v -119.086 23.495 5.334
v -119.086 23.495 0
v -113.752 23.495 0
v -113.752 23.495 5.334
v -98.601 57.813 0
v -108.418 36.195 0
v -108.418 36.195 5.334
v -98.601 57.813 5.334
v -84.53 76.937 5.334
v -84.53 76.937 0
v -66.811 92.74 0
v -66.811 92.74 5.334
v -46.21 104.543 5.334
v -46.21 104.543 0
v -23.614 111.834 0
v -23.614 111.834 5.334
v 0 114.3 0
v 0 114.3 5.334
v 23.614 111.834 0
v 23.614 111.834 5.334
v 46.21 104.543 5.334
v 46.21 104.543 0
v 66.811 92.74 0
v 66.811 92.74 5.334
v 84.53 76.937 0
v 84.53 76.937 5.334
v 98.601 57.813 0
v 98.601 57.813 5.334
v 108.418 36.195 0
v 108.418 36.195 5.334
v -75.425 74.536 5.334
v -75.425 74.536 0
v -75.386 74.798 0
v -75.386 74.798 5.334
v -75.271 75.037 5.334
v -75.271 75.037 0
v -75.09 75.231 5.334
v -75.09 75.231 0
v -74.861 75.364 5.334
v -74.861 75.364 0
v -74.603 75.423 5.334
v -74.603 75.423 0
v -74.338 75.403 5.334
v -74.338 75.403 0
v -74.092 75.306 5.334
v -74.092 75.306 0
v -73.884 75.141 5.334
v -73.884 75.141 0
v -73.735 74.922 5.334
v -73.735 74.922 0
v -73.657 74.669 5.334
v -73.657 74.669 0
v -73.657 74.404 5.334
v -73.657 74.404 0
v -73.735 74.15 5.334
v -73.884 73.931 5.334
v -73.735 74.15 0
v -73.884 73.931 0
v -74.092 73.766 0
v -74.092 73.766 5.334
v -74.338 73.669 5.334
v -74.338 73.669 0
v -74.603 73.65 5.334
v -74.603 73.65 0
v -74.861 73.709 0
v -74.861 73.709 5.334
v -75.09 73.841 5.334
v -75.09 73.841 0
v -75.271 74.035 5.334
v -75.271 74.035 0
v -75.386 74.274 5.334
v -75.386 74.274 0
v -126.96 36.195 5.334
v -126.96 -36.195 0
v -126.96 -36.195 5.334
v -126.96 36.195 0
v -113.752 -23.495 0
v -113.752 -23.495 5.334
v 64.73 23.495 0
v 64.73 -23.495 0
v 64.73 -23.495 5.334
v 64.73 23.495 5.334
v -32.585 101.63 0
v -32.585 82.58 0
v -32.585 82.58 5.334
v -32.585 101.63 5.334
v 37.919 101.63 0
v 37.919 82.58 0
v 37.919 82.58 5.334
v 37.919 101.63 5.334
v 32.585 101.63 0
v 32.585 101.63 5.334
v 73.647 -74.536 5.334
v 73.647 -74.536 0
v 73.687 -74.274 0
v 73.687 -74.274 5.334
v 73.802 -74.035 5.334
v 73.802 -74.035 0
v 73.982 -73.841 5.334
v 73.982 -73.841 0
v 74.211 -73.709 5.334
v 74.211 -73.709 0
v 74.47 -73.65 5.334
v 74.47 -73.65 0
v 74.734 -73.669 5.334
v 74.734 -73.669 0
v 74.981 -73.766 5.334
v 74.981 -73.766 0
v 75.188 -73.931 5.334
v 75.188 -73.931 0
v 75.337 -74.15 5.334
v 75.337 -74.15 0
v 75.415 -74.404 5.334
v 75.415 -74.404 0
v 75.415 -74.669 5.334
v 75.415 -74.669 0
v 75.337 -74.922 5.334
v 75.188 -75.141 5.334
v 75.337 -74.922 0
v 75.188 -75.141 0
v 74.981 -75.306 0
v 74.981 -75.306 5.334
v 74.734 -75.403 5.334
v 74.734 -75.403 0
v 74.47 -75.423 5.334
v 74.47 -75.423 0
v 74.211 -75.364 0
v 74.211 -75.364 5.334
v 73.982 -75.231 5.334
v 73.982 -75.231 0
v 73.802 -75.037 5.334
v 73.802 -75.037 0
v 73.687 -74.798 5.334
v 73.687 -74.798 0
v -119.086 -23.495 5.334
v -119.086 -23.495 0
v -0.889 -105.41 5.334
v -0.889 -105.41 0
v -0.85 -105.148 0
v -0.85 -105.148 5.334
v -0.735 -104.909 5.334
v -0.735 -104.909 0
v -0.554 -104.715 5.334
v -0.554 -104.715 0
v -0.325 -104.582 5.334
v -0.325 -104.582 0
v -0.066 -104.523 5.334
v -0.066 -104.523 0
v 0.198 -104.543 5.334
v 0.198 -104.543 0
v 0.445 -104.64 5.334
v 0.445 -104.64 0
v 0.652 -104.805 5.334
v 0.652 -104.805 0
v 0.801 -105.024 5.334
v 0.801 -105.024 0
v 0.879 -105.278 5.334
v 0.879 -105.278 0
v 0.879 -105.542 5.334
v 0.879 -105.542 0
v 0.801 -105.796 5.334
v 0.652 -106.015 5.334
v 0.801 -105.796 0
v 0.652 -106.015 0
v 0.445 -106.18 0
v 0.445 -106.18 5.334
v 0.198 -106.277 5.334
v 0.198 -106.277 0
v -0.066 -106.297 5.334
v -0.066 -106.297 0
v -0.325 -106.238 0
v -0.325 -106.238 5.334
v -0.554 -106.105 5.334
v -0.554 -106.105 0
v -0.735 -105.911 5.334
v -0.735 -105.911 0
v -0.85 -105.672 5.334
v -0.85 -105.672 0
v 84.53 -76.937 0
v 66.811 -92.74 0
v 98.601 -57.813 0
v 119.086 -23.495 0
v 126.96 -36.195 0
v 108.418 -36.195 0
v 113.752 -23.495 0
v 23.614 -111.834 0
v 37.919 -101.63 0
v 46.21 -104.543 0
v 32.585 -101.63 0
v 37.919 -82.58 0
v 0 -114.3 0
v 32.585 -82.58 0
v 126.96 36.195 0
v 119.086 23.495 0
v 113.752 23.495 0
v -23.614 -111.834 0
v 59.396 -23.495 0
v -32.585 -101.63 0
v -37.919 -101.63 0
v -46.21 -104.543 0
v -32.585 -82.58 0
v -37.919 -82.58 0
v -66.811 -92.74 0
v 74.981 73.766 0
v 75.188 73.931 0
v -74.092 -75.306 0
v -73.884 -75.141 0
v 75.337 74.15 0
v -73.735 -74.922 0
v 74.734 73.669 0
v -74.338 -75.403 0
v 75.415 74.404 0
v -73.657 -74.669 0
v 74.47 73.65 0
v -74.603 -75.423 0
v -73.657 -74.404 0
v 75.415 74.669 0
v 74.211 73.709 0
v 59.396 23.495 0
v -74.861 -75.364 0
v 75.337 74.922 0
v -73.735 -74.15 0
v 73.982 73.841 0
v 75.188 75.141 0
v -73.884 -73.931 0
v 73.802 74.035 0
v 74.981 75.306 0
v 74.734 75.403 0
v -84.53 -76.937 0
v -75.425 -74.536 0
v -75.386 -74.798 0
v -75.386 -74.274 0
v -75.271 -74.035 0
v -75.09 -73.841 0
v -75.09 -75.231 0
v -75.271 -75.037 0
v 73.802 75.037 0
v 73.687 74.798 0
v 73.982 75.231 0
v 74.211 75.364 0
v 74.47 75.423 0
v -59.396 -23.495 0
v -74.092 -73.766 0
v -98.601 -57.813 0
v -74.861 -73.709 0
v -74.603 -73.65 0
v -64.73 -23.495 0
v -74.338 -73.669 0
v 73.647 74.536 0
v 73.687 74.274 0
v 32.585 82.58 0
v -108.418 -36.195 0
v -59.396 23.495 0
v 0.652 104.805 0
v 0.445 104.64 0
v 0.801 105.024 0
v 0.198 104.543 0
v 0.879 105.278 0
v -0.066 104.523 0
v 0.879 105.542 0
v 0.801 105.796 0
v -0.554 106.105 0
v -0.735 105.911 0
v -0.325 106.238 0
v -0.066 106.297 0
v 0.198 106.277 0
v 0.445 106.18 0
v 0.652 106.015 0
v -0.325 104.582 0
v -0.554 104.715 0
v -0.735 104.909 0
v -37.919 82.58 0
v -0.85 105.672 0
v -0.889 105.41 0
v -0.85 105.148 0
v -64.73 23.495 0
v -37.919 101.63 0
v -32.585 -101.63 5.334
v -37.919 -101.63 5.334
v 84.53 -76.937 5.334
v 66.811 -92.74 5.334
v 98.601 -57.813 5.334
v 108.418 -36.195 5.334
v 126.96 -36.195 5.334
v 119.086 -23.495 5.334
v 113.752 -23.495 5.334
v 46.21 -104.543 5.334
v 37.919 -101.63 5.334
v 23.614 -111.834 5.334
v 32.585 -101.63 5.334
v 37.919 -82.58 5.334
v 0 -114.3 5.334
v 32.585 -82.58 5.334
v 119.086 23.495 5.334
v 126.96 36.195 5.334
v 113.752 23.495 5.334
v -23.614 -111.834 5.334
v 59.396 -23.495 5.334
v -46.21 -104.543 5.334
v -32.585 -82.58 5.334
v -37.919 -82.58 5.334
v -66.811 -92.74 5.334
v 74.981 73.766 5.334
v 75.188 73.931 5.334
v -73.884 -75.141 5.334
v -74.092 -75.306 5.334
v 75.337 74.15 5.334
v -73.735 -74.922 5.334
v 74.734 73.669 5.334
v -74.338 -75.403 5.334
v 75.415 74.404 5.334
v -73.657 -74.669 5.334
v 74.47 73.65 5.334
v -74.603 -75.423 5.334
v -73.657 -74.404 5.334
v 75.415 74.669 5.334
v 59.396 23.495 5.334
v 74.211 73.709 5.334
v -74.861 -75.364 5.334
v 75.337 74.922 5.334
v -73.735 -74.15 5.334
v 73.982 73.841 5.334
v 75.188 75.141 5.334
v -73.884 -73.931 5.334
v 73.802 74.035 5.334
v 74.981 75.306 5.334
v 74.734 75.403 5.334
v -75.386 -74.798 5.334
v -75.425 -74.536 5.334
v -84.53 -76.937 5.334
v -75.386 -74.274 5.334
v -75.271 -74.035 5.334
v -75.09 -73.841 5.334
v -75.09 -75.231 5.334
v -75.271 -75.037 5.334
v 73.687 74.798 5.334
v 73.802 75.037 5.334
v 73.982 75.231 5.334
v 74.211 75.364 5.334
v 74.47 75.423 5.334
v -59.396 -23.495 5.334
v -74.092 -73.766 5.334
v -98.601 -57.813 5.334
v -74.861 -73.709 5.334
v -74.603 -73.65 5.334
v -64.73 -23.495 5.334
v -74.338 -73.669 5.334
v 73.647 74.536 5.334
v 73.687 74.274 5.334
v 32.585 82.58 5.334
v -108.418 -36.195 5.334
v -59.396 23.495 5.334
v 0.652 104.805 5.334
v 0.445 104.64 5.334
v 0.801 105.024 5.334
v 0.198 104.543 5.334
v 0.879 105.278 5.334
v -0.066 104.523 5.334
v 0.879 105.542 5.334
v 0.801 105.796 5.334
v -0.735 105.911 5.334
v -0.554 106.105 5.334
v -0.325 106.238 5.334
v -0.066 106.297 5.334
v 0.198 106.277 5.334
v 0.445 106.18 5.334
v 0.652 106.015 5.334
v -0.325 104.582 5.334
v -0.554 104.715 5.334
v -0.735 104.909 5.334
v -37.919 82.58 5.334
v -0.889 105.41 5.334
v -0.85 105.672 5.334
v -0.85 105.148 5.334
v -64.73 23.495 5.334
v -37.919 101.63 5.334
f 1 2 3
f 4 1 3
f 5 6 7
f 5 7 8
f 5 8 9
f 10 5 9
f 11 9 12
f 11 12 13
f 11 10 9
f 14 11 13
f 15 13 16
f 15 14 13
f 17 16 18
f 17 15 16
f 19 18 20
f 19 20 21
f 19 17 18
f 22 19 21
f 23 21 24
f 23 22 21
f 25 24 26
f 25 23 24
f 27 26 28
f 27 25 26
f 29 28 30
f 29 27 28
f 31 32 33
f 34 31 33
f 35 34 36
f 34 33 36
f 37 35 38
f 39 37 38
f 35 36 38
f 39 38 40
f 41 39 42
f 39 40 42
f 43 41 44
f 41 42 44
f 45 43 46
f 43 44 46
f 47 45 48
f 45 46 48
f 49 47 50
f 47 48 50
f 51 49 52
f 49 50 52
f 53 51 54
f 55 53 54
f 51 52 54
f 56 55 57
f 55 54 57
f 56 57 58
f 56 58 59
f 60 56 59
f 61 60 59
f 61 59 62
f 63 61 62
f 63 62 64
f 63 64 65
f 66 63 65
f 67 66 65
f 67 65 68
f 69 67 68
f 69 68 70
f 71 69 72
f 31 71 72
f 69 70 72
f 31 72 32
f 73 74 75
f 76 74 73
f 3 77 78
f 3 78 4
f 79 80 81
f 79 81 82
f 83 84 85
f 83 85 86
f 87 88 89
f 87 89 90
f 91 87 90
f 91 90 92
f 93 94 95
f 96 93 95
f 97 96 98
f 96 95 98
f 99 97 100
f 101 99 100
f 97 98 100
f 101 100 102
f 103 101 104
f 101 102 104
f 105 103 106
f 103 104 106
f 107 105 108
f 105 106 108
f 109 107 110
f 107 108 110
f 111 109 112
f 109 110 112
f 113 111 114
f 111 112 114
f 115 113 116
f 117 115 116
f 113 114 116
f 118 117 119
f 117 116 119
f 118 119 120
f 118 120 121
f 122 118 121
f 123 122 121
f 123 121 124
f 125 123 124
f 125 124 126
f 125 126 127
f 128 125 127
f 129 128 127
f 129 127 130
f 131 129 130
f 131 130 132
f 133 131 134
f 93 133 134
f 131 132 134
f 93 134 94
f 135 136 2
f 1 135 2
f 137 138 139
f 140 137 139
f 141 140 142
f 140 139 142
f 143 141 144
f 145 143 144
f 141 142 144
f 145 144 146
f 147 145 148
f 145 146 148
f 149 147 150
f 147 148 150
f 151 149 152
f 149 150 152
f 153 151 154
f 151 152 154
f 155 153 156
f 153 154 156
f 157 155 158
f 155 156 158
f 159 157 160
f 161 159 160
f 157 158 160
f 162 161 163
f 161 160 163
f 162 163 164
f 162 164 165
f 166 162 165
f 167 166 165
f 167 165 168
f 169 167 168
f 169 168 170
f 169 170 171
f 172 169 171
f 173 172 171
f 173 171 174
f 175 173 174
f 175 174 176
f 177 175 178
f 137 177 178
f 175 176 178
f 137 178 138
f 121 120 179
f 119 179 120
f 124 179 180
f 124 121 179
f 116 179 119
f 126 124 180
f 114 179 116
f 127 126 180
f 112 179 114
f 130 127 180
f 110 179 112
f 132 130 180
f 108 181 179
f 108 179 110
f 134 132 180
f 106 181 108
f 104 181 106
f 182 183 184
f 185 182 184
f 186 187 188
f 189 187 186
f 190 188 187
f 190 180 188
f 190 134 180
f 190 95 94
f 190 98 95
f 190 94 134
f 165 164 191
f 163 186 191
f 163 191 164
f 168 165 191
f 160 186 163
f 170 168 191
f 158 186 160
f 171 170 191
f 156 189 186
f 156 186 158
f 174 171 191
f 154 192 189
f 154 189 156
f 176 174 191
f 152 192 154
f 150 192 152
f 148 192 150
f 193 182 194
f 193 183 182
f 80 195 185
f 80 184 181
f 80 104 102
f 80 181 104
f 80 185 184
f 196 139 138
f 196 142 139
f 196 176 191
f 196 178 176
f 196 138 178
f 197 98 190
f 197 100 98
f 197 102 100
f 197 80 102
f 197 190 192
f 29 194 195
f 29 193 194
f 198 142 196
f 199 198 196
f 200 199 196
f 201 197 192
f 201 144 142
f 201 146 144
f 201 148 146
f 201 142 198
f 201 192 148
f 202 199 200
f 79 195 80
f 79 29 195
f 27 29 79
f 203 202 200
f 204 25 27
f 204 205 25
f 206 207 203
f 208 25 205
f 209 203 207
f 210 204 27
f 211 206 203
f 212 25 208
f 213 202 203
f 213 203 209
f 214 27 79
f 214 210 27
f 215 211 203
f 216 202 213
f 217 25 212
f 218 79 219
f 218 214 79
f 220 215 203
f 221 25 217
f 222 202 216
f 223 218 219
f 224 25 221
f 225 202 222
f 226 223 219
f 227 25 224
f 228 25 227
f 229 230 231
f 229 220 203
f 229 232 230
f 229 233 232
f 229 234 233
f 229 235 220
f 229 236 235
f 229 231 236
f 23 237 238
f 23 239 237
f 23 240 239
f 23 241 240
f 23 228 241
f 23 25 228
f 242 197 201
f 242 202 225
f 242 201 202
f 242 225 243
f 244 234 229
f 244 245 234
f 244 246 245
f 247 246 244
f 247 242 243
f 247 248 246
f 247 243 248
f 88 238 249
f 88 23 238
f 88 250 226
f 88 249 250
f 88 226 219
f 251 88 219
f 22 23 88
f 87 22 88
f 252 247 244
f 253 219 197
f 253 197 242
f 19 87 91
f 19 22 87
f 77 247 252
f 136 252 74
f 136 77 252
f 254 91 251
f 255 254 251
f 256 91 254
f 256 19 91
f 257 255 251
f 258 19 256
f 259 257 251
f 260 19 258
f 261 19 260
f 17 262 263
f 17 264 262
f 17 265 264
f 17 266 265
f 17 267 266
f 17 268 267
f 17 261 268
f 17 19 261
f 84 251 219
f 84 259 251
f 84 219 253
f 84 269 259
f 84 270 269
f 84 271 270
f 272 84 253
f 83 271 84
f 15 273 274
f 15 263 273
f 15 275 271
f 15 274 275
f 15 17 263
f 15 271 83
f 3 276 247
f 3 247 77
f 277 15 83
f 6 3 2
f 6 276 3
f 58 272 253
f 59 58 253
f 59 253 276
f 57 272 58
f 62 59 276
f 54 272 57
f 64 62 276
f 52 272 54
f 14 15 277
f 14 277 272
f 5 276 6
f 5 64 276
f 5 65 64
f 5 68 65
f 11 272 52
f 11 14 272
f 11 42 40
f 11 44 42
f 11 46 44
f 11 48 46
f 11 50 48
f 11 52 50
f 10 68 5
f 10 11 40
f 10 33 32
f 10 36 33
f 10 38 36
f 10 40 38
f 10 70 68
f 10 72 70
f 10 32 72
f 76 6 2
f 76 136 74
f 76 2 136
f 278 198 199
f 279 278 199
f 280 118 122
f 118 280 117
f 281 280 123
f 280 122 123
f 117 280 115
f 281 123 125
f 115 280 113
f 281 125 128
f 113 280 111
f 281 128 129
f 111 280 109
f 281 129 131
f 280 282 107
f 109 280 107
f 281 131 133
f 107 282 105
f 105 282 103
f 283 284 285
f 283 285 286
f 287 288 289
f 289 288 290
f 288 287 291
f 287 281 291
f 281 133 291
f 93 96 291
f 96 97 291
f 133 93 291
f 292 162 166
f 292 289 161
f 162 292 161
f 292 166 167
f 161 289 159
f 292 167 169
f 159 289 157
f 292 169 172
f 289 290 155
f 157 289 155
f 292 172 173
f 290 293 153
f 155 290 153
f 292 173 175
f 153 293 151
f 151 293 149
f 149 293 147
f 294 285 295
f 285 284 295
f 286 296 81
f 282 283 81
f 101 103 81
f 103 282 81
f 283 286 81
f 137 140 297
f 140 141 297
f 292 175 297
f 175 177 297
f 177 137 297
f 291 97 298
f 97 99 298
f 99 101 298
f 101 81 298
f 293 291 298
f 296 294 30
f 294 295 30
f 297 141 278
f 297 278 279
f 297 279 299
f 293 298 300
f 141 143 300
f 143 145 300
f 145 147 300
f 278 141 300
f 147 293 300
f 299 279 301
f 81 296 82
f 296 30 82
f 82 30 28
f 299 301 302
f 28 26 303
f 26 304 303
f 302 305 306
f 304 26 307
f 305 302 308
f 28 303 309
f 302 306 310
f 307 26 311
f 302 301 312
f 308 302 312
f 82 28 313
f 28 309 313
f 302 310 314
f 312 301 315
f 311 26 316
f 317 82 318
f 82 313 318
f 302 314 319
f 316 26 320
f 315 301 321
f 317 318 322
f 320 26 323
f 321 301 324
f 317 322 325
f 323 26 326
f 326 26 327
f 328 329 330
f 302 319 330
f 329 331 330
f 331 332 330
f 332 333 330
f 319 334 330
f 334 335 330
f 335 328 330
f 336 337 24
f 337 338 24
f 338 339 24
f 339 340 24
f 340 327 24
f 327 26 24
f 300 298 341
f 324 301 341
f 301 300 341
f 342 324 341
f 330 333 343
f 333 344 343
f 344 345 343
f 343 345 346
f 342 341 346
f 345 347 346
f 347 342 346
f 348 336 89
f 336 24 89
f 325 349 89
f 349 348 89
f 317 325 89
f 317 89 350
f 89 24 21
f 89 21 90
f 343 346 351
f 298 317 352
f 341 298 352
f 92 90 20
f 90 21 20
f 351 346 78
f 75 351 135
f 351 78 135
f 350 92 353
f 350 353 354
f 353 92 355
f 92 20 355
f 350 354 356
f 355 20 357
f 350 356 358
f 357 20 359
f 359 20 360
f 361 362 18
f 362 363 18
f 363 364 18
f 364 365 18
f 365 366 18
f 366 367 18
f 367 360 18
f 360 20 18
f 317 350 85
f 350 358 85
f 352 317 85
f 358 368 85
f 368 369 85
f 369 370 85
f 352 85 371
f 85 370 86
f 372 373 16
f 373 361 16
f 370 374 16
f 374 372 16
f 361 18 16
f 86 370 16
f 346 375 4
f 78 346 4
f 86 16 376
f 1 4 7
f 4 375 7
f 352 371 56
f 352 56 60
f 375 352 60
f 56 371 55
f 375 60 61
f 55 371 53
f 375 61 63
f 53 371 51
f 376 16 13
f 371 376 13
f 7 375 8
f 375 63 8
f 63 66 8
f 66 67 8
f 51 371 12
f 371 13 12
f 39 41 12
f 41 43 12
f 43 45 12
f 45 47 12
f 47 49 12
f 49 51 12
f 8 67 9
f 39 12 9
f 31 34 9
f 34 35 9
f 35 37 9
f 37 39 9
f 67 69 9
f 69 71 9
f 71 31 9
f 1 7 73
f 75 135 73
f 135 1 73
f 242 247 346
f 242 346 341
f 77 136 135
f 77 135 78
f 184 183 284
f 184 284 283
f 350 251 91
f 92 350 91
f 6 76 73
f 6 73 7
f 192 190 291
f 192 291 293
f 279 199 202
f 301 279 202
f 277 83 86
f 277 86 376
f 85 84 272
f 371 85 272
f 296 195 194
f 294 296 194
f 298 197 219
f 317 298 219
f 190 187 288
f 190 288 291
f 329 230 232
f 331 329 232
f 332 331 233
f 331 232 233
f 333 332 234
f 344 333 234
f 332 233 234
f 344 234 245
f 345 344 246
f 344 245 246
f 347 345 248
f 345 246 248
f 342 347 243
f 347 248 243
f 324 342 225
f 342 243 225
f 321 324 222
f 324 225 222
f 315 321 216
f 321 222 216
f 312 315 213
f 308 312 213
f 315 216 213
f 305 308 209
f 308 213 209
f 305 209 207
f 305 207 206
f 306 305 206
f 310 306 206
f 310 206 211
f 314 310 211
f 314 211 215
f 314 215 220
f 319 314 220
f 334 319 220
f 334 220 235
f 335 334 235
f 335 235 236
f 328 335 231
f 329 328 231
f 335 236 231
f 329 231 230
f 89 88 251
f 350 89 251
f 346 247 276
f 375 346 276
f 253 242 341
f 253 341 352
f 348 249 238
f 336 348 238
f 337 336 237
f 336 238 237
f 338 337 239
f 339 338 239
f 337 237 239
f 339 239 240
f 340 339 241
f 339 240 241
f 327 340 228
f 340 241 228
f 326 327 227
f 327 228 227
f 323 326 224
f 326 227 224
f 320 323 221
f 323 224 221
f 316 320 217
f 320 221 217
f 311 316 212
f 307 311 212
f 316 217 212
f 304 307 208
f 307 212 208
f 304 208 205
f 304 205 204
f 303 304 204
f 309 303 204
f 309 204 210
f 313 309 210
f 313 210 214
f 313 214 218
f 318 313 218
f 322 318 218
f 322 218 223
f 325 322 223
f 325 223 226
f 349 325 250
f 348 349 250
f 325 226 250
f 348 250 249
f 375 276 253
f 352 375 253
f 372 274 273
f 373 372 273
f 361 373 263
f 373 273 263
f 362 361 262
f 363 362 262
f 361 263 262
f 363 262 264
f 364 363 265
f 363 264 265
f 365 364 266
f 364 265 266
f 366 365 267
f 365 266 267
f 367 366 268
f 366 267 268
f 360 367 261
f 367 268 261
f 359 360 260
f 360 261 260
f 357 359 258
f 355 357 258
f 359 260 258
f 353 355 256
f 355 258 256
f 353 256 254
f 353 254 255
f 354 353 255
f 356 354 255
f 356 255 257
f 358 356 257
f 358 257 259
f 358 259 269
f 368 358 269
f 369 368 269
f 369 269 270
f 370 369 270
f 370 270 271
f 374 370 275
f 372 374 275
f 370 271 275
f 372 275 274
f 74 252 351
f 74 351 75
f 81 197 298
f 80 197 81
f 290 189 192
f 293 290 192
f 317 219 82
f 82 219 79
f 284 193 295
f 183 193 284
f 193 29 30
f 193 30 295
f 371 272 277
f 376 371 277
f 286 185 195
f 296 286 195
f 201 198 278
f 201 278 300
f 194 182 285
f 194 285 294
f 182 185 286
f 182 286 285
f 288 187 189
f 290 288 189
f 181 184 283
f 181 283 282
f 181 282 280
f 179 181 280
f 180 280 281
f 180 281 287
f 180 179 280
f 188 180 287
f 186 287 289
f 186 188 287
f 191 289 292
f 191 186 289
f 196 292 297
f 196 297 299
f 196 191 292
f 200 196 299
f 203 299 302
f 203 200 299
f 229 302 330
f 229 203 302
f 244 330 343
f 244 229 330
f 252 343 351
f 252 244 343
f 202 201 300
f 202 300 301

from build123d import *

# Parameters (mm, degrees)
SKETCH1_W                     = 5.334
SKETCH1_H                     = 46.99
BASE_PLATFORM_DEPTH           = 5.334
SKETCH5_R                     = 0.889
PERIMETER_STACKING_CUTS_DEPTH = 5.334
SKETCH6_W                     = 5.334
SKETCH6_H                     = 19.05
SKID_HOLES_DEPTH              = 5.334


with BuildPart() as part:
    # Sketch1 → Base Platform (new body)
    with BuildSketch(Plane.XY):
        with BuildLine():
            Line((126.959765957, -36.195), (108.417765957, -36.195))
            ThreePointArc((108.417765957, -36.195), (0, -114.3), (-108.417765957, -36.195))
            Line((-108.417765957, -36.195), (-126.959765957, -36.195))
            Line((-126.959765957, -36.195), (-126.959765957, 36.195))
            Line((-126.959765957, 36.195), (-108.417765957, 36.195))
            ThreePointArc((-108.417765957, 36.195), (0, 114.3), (108.417765957, 36.195))
            Line((108.417765957, 36.195), (126.959765957, 36.195))
            Line((126.959765957, 36.195), (126.959765957, -36.195))
        make_face()
        with Locations((-116.418765957, 0)):
            Rectangle(SKETCH1_W, SKETCH1_H, mode=Mode.SUBTRACT)
        with Locations((62.062765957, 0)):
            Rectangle(SKETCH1_W, SKETCH1_H, mode=Mode.SUBTRACT)
        with Locations((-62.062765957, 0)):
            Rectangle(SKETCH1_W, SKETCH1_H, mode=Mode.SUBTRACT)
        with Locations((116.418765957, 0)):
            Rectangle(SKETCH1_W, SKETCH1_H, mode=Mode.SUBTRACT)
    extrude(amount=BASE_PLATFORM_DEPTH)

    # Sketch5 → Perimeter stacking cuts (cut)
    with BuildSketch(Plane(origin=(0, 0, 0), x_dir=(-1, 0, 0), z_dir=(0, 0, -1))):
        with Locations((0, 105.41)):
            Circle(SKETCH5_R)
        with Locations((0, -105.41)):
            Circle(SKETCH5_R)
        with Locations((-74.536125805, 74.536125805)):
            Circle(SKETCH5_R)
        with Locations((74.536125805, 74.536125805)):
            Circle(SKETCH5_R)
        with Locations((74.536125805, -74.536125805)):
            Circle(SKETCH5_R)
        with Locations((-74.536125805, -74.536125805)):
            Circle(SKETCH5_R)
    extrude(amount=-PERIMETER_STACKING_CUTS_DEPTH, mode=Mode.SUBTRACT)

    # Sketch6 → Skid Holes (cut)
    with BuildSketch(Plane(origin=(0, 0, 0), x_dir=(-1, 0, 0), z_dir=(0, 0, -1))):
        with Locations((-35.251559841, 92.105443783)):
            Rectangle(SKETCH6_W, SKETCH6_H)
        with Locations((35.251559841, 92.105443783)):
            Rectangle(SKETCH6_W, SKETCH6_H)
        with Locations((35.251559841, -92.105443783)):
            Rectangle(SKETCH6_W, SKETCH6_H)
        with Locations((-35.251559841, -92.105443783)):
            Rectangle(SKETCH6_W, SKETCH6_H)
    extrude(amount=-SKID_HOLES_DEPTH, mode=Mode.SUBTRACT)


solid = part.part
